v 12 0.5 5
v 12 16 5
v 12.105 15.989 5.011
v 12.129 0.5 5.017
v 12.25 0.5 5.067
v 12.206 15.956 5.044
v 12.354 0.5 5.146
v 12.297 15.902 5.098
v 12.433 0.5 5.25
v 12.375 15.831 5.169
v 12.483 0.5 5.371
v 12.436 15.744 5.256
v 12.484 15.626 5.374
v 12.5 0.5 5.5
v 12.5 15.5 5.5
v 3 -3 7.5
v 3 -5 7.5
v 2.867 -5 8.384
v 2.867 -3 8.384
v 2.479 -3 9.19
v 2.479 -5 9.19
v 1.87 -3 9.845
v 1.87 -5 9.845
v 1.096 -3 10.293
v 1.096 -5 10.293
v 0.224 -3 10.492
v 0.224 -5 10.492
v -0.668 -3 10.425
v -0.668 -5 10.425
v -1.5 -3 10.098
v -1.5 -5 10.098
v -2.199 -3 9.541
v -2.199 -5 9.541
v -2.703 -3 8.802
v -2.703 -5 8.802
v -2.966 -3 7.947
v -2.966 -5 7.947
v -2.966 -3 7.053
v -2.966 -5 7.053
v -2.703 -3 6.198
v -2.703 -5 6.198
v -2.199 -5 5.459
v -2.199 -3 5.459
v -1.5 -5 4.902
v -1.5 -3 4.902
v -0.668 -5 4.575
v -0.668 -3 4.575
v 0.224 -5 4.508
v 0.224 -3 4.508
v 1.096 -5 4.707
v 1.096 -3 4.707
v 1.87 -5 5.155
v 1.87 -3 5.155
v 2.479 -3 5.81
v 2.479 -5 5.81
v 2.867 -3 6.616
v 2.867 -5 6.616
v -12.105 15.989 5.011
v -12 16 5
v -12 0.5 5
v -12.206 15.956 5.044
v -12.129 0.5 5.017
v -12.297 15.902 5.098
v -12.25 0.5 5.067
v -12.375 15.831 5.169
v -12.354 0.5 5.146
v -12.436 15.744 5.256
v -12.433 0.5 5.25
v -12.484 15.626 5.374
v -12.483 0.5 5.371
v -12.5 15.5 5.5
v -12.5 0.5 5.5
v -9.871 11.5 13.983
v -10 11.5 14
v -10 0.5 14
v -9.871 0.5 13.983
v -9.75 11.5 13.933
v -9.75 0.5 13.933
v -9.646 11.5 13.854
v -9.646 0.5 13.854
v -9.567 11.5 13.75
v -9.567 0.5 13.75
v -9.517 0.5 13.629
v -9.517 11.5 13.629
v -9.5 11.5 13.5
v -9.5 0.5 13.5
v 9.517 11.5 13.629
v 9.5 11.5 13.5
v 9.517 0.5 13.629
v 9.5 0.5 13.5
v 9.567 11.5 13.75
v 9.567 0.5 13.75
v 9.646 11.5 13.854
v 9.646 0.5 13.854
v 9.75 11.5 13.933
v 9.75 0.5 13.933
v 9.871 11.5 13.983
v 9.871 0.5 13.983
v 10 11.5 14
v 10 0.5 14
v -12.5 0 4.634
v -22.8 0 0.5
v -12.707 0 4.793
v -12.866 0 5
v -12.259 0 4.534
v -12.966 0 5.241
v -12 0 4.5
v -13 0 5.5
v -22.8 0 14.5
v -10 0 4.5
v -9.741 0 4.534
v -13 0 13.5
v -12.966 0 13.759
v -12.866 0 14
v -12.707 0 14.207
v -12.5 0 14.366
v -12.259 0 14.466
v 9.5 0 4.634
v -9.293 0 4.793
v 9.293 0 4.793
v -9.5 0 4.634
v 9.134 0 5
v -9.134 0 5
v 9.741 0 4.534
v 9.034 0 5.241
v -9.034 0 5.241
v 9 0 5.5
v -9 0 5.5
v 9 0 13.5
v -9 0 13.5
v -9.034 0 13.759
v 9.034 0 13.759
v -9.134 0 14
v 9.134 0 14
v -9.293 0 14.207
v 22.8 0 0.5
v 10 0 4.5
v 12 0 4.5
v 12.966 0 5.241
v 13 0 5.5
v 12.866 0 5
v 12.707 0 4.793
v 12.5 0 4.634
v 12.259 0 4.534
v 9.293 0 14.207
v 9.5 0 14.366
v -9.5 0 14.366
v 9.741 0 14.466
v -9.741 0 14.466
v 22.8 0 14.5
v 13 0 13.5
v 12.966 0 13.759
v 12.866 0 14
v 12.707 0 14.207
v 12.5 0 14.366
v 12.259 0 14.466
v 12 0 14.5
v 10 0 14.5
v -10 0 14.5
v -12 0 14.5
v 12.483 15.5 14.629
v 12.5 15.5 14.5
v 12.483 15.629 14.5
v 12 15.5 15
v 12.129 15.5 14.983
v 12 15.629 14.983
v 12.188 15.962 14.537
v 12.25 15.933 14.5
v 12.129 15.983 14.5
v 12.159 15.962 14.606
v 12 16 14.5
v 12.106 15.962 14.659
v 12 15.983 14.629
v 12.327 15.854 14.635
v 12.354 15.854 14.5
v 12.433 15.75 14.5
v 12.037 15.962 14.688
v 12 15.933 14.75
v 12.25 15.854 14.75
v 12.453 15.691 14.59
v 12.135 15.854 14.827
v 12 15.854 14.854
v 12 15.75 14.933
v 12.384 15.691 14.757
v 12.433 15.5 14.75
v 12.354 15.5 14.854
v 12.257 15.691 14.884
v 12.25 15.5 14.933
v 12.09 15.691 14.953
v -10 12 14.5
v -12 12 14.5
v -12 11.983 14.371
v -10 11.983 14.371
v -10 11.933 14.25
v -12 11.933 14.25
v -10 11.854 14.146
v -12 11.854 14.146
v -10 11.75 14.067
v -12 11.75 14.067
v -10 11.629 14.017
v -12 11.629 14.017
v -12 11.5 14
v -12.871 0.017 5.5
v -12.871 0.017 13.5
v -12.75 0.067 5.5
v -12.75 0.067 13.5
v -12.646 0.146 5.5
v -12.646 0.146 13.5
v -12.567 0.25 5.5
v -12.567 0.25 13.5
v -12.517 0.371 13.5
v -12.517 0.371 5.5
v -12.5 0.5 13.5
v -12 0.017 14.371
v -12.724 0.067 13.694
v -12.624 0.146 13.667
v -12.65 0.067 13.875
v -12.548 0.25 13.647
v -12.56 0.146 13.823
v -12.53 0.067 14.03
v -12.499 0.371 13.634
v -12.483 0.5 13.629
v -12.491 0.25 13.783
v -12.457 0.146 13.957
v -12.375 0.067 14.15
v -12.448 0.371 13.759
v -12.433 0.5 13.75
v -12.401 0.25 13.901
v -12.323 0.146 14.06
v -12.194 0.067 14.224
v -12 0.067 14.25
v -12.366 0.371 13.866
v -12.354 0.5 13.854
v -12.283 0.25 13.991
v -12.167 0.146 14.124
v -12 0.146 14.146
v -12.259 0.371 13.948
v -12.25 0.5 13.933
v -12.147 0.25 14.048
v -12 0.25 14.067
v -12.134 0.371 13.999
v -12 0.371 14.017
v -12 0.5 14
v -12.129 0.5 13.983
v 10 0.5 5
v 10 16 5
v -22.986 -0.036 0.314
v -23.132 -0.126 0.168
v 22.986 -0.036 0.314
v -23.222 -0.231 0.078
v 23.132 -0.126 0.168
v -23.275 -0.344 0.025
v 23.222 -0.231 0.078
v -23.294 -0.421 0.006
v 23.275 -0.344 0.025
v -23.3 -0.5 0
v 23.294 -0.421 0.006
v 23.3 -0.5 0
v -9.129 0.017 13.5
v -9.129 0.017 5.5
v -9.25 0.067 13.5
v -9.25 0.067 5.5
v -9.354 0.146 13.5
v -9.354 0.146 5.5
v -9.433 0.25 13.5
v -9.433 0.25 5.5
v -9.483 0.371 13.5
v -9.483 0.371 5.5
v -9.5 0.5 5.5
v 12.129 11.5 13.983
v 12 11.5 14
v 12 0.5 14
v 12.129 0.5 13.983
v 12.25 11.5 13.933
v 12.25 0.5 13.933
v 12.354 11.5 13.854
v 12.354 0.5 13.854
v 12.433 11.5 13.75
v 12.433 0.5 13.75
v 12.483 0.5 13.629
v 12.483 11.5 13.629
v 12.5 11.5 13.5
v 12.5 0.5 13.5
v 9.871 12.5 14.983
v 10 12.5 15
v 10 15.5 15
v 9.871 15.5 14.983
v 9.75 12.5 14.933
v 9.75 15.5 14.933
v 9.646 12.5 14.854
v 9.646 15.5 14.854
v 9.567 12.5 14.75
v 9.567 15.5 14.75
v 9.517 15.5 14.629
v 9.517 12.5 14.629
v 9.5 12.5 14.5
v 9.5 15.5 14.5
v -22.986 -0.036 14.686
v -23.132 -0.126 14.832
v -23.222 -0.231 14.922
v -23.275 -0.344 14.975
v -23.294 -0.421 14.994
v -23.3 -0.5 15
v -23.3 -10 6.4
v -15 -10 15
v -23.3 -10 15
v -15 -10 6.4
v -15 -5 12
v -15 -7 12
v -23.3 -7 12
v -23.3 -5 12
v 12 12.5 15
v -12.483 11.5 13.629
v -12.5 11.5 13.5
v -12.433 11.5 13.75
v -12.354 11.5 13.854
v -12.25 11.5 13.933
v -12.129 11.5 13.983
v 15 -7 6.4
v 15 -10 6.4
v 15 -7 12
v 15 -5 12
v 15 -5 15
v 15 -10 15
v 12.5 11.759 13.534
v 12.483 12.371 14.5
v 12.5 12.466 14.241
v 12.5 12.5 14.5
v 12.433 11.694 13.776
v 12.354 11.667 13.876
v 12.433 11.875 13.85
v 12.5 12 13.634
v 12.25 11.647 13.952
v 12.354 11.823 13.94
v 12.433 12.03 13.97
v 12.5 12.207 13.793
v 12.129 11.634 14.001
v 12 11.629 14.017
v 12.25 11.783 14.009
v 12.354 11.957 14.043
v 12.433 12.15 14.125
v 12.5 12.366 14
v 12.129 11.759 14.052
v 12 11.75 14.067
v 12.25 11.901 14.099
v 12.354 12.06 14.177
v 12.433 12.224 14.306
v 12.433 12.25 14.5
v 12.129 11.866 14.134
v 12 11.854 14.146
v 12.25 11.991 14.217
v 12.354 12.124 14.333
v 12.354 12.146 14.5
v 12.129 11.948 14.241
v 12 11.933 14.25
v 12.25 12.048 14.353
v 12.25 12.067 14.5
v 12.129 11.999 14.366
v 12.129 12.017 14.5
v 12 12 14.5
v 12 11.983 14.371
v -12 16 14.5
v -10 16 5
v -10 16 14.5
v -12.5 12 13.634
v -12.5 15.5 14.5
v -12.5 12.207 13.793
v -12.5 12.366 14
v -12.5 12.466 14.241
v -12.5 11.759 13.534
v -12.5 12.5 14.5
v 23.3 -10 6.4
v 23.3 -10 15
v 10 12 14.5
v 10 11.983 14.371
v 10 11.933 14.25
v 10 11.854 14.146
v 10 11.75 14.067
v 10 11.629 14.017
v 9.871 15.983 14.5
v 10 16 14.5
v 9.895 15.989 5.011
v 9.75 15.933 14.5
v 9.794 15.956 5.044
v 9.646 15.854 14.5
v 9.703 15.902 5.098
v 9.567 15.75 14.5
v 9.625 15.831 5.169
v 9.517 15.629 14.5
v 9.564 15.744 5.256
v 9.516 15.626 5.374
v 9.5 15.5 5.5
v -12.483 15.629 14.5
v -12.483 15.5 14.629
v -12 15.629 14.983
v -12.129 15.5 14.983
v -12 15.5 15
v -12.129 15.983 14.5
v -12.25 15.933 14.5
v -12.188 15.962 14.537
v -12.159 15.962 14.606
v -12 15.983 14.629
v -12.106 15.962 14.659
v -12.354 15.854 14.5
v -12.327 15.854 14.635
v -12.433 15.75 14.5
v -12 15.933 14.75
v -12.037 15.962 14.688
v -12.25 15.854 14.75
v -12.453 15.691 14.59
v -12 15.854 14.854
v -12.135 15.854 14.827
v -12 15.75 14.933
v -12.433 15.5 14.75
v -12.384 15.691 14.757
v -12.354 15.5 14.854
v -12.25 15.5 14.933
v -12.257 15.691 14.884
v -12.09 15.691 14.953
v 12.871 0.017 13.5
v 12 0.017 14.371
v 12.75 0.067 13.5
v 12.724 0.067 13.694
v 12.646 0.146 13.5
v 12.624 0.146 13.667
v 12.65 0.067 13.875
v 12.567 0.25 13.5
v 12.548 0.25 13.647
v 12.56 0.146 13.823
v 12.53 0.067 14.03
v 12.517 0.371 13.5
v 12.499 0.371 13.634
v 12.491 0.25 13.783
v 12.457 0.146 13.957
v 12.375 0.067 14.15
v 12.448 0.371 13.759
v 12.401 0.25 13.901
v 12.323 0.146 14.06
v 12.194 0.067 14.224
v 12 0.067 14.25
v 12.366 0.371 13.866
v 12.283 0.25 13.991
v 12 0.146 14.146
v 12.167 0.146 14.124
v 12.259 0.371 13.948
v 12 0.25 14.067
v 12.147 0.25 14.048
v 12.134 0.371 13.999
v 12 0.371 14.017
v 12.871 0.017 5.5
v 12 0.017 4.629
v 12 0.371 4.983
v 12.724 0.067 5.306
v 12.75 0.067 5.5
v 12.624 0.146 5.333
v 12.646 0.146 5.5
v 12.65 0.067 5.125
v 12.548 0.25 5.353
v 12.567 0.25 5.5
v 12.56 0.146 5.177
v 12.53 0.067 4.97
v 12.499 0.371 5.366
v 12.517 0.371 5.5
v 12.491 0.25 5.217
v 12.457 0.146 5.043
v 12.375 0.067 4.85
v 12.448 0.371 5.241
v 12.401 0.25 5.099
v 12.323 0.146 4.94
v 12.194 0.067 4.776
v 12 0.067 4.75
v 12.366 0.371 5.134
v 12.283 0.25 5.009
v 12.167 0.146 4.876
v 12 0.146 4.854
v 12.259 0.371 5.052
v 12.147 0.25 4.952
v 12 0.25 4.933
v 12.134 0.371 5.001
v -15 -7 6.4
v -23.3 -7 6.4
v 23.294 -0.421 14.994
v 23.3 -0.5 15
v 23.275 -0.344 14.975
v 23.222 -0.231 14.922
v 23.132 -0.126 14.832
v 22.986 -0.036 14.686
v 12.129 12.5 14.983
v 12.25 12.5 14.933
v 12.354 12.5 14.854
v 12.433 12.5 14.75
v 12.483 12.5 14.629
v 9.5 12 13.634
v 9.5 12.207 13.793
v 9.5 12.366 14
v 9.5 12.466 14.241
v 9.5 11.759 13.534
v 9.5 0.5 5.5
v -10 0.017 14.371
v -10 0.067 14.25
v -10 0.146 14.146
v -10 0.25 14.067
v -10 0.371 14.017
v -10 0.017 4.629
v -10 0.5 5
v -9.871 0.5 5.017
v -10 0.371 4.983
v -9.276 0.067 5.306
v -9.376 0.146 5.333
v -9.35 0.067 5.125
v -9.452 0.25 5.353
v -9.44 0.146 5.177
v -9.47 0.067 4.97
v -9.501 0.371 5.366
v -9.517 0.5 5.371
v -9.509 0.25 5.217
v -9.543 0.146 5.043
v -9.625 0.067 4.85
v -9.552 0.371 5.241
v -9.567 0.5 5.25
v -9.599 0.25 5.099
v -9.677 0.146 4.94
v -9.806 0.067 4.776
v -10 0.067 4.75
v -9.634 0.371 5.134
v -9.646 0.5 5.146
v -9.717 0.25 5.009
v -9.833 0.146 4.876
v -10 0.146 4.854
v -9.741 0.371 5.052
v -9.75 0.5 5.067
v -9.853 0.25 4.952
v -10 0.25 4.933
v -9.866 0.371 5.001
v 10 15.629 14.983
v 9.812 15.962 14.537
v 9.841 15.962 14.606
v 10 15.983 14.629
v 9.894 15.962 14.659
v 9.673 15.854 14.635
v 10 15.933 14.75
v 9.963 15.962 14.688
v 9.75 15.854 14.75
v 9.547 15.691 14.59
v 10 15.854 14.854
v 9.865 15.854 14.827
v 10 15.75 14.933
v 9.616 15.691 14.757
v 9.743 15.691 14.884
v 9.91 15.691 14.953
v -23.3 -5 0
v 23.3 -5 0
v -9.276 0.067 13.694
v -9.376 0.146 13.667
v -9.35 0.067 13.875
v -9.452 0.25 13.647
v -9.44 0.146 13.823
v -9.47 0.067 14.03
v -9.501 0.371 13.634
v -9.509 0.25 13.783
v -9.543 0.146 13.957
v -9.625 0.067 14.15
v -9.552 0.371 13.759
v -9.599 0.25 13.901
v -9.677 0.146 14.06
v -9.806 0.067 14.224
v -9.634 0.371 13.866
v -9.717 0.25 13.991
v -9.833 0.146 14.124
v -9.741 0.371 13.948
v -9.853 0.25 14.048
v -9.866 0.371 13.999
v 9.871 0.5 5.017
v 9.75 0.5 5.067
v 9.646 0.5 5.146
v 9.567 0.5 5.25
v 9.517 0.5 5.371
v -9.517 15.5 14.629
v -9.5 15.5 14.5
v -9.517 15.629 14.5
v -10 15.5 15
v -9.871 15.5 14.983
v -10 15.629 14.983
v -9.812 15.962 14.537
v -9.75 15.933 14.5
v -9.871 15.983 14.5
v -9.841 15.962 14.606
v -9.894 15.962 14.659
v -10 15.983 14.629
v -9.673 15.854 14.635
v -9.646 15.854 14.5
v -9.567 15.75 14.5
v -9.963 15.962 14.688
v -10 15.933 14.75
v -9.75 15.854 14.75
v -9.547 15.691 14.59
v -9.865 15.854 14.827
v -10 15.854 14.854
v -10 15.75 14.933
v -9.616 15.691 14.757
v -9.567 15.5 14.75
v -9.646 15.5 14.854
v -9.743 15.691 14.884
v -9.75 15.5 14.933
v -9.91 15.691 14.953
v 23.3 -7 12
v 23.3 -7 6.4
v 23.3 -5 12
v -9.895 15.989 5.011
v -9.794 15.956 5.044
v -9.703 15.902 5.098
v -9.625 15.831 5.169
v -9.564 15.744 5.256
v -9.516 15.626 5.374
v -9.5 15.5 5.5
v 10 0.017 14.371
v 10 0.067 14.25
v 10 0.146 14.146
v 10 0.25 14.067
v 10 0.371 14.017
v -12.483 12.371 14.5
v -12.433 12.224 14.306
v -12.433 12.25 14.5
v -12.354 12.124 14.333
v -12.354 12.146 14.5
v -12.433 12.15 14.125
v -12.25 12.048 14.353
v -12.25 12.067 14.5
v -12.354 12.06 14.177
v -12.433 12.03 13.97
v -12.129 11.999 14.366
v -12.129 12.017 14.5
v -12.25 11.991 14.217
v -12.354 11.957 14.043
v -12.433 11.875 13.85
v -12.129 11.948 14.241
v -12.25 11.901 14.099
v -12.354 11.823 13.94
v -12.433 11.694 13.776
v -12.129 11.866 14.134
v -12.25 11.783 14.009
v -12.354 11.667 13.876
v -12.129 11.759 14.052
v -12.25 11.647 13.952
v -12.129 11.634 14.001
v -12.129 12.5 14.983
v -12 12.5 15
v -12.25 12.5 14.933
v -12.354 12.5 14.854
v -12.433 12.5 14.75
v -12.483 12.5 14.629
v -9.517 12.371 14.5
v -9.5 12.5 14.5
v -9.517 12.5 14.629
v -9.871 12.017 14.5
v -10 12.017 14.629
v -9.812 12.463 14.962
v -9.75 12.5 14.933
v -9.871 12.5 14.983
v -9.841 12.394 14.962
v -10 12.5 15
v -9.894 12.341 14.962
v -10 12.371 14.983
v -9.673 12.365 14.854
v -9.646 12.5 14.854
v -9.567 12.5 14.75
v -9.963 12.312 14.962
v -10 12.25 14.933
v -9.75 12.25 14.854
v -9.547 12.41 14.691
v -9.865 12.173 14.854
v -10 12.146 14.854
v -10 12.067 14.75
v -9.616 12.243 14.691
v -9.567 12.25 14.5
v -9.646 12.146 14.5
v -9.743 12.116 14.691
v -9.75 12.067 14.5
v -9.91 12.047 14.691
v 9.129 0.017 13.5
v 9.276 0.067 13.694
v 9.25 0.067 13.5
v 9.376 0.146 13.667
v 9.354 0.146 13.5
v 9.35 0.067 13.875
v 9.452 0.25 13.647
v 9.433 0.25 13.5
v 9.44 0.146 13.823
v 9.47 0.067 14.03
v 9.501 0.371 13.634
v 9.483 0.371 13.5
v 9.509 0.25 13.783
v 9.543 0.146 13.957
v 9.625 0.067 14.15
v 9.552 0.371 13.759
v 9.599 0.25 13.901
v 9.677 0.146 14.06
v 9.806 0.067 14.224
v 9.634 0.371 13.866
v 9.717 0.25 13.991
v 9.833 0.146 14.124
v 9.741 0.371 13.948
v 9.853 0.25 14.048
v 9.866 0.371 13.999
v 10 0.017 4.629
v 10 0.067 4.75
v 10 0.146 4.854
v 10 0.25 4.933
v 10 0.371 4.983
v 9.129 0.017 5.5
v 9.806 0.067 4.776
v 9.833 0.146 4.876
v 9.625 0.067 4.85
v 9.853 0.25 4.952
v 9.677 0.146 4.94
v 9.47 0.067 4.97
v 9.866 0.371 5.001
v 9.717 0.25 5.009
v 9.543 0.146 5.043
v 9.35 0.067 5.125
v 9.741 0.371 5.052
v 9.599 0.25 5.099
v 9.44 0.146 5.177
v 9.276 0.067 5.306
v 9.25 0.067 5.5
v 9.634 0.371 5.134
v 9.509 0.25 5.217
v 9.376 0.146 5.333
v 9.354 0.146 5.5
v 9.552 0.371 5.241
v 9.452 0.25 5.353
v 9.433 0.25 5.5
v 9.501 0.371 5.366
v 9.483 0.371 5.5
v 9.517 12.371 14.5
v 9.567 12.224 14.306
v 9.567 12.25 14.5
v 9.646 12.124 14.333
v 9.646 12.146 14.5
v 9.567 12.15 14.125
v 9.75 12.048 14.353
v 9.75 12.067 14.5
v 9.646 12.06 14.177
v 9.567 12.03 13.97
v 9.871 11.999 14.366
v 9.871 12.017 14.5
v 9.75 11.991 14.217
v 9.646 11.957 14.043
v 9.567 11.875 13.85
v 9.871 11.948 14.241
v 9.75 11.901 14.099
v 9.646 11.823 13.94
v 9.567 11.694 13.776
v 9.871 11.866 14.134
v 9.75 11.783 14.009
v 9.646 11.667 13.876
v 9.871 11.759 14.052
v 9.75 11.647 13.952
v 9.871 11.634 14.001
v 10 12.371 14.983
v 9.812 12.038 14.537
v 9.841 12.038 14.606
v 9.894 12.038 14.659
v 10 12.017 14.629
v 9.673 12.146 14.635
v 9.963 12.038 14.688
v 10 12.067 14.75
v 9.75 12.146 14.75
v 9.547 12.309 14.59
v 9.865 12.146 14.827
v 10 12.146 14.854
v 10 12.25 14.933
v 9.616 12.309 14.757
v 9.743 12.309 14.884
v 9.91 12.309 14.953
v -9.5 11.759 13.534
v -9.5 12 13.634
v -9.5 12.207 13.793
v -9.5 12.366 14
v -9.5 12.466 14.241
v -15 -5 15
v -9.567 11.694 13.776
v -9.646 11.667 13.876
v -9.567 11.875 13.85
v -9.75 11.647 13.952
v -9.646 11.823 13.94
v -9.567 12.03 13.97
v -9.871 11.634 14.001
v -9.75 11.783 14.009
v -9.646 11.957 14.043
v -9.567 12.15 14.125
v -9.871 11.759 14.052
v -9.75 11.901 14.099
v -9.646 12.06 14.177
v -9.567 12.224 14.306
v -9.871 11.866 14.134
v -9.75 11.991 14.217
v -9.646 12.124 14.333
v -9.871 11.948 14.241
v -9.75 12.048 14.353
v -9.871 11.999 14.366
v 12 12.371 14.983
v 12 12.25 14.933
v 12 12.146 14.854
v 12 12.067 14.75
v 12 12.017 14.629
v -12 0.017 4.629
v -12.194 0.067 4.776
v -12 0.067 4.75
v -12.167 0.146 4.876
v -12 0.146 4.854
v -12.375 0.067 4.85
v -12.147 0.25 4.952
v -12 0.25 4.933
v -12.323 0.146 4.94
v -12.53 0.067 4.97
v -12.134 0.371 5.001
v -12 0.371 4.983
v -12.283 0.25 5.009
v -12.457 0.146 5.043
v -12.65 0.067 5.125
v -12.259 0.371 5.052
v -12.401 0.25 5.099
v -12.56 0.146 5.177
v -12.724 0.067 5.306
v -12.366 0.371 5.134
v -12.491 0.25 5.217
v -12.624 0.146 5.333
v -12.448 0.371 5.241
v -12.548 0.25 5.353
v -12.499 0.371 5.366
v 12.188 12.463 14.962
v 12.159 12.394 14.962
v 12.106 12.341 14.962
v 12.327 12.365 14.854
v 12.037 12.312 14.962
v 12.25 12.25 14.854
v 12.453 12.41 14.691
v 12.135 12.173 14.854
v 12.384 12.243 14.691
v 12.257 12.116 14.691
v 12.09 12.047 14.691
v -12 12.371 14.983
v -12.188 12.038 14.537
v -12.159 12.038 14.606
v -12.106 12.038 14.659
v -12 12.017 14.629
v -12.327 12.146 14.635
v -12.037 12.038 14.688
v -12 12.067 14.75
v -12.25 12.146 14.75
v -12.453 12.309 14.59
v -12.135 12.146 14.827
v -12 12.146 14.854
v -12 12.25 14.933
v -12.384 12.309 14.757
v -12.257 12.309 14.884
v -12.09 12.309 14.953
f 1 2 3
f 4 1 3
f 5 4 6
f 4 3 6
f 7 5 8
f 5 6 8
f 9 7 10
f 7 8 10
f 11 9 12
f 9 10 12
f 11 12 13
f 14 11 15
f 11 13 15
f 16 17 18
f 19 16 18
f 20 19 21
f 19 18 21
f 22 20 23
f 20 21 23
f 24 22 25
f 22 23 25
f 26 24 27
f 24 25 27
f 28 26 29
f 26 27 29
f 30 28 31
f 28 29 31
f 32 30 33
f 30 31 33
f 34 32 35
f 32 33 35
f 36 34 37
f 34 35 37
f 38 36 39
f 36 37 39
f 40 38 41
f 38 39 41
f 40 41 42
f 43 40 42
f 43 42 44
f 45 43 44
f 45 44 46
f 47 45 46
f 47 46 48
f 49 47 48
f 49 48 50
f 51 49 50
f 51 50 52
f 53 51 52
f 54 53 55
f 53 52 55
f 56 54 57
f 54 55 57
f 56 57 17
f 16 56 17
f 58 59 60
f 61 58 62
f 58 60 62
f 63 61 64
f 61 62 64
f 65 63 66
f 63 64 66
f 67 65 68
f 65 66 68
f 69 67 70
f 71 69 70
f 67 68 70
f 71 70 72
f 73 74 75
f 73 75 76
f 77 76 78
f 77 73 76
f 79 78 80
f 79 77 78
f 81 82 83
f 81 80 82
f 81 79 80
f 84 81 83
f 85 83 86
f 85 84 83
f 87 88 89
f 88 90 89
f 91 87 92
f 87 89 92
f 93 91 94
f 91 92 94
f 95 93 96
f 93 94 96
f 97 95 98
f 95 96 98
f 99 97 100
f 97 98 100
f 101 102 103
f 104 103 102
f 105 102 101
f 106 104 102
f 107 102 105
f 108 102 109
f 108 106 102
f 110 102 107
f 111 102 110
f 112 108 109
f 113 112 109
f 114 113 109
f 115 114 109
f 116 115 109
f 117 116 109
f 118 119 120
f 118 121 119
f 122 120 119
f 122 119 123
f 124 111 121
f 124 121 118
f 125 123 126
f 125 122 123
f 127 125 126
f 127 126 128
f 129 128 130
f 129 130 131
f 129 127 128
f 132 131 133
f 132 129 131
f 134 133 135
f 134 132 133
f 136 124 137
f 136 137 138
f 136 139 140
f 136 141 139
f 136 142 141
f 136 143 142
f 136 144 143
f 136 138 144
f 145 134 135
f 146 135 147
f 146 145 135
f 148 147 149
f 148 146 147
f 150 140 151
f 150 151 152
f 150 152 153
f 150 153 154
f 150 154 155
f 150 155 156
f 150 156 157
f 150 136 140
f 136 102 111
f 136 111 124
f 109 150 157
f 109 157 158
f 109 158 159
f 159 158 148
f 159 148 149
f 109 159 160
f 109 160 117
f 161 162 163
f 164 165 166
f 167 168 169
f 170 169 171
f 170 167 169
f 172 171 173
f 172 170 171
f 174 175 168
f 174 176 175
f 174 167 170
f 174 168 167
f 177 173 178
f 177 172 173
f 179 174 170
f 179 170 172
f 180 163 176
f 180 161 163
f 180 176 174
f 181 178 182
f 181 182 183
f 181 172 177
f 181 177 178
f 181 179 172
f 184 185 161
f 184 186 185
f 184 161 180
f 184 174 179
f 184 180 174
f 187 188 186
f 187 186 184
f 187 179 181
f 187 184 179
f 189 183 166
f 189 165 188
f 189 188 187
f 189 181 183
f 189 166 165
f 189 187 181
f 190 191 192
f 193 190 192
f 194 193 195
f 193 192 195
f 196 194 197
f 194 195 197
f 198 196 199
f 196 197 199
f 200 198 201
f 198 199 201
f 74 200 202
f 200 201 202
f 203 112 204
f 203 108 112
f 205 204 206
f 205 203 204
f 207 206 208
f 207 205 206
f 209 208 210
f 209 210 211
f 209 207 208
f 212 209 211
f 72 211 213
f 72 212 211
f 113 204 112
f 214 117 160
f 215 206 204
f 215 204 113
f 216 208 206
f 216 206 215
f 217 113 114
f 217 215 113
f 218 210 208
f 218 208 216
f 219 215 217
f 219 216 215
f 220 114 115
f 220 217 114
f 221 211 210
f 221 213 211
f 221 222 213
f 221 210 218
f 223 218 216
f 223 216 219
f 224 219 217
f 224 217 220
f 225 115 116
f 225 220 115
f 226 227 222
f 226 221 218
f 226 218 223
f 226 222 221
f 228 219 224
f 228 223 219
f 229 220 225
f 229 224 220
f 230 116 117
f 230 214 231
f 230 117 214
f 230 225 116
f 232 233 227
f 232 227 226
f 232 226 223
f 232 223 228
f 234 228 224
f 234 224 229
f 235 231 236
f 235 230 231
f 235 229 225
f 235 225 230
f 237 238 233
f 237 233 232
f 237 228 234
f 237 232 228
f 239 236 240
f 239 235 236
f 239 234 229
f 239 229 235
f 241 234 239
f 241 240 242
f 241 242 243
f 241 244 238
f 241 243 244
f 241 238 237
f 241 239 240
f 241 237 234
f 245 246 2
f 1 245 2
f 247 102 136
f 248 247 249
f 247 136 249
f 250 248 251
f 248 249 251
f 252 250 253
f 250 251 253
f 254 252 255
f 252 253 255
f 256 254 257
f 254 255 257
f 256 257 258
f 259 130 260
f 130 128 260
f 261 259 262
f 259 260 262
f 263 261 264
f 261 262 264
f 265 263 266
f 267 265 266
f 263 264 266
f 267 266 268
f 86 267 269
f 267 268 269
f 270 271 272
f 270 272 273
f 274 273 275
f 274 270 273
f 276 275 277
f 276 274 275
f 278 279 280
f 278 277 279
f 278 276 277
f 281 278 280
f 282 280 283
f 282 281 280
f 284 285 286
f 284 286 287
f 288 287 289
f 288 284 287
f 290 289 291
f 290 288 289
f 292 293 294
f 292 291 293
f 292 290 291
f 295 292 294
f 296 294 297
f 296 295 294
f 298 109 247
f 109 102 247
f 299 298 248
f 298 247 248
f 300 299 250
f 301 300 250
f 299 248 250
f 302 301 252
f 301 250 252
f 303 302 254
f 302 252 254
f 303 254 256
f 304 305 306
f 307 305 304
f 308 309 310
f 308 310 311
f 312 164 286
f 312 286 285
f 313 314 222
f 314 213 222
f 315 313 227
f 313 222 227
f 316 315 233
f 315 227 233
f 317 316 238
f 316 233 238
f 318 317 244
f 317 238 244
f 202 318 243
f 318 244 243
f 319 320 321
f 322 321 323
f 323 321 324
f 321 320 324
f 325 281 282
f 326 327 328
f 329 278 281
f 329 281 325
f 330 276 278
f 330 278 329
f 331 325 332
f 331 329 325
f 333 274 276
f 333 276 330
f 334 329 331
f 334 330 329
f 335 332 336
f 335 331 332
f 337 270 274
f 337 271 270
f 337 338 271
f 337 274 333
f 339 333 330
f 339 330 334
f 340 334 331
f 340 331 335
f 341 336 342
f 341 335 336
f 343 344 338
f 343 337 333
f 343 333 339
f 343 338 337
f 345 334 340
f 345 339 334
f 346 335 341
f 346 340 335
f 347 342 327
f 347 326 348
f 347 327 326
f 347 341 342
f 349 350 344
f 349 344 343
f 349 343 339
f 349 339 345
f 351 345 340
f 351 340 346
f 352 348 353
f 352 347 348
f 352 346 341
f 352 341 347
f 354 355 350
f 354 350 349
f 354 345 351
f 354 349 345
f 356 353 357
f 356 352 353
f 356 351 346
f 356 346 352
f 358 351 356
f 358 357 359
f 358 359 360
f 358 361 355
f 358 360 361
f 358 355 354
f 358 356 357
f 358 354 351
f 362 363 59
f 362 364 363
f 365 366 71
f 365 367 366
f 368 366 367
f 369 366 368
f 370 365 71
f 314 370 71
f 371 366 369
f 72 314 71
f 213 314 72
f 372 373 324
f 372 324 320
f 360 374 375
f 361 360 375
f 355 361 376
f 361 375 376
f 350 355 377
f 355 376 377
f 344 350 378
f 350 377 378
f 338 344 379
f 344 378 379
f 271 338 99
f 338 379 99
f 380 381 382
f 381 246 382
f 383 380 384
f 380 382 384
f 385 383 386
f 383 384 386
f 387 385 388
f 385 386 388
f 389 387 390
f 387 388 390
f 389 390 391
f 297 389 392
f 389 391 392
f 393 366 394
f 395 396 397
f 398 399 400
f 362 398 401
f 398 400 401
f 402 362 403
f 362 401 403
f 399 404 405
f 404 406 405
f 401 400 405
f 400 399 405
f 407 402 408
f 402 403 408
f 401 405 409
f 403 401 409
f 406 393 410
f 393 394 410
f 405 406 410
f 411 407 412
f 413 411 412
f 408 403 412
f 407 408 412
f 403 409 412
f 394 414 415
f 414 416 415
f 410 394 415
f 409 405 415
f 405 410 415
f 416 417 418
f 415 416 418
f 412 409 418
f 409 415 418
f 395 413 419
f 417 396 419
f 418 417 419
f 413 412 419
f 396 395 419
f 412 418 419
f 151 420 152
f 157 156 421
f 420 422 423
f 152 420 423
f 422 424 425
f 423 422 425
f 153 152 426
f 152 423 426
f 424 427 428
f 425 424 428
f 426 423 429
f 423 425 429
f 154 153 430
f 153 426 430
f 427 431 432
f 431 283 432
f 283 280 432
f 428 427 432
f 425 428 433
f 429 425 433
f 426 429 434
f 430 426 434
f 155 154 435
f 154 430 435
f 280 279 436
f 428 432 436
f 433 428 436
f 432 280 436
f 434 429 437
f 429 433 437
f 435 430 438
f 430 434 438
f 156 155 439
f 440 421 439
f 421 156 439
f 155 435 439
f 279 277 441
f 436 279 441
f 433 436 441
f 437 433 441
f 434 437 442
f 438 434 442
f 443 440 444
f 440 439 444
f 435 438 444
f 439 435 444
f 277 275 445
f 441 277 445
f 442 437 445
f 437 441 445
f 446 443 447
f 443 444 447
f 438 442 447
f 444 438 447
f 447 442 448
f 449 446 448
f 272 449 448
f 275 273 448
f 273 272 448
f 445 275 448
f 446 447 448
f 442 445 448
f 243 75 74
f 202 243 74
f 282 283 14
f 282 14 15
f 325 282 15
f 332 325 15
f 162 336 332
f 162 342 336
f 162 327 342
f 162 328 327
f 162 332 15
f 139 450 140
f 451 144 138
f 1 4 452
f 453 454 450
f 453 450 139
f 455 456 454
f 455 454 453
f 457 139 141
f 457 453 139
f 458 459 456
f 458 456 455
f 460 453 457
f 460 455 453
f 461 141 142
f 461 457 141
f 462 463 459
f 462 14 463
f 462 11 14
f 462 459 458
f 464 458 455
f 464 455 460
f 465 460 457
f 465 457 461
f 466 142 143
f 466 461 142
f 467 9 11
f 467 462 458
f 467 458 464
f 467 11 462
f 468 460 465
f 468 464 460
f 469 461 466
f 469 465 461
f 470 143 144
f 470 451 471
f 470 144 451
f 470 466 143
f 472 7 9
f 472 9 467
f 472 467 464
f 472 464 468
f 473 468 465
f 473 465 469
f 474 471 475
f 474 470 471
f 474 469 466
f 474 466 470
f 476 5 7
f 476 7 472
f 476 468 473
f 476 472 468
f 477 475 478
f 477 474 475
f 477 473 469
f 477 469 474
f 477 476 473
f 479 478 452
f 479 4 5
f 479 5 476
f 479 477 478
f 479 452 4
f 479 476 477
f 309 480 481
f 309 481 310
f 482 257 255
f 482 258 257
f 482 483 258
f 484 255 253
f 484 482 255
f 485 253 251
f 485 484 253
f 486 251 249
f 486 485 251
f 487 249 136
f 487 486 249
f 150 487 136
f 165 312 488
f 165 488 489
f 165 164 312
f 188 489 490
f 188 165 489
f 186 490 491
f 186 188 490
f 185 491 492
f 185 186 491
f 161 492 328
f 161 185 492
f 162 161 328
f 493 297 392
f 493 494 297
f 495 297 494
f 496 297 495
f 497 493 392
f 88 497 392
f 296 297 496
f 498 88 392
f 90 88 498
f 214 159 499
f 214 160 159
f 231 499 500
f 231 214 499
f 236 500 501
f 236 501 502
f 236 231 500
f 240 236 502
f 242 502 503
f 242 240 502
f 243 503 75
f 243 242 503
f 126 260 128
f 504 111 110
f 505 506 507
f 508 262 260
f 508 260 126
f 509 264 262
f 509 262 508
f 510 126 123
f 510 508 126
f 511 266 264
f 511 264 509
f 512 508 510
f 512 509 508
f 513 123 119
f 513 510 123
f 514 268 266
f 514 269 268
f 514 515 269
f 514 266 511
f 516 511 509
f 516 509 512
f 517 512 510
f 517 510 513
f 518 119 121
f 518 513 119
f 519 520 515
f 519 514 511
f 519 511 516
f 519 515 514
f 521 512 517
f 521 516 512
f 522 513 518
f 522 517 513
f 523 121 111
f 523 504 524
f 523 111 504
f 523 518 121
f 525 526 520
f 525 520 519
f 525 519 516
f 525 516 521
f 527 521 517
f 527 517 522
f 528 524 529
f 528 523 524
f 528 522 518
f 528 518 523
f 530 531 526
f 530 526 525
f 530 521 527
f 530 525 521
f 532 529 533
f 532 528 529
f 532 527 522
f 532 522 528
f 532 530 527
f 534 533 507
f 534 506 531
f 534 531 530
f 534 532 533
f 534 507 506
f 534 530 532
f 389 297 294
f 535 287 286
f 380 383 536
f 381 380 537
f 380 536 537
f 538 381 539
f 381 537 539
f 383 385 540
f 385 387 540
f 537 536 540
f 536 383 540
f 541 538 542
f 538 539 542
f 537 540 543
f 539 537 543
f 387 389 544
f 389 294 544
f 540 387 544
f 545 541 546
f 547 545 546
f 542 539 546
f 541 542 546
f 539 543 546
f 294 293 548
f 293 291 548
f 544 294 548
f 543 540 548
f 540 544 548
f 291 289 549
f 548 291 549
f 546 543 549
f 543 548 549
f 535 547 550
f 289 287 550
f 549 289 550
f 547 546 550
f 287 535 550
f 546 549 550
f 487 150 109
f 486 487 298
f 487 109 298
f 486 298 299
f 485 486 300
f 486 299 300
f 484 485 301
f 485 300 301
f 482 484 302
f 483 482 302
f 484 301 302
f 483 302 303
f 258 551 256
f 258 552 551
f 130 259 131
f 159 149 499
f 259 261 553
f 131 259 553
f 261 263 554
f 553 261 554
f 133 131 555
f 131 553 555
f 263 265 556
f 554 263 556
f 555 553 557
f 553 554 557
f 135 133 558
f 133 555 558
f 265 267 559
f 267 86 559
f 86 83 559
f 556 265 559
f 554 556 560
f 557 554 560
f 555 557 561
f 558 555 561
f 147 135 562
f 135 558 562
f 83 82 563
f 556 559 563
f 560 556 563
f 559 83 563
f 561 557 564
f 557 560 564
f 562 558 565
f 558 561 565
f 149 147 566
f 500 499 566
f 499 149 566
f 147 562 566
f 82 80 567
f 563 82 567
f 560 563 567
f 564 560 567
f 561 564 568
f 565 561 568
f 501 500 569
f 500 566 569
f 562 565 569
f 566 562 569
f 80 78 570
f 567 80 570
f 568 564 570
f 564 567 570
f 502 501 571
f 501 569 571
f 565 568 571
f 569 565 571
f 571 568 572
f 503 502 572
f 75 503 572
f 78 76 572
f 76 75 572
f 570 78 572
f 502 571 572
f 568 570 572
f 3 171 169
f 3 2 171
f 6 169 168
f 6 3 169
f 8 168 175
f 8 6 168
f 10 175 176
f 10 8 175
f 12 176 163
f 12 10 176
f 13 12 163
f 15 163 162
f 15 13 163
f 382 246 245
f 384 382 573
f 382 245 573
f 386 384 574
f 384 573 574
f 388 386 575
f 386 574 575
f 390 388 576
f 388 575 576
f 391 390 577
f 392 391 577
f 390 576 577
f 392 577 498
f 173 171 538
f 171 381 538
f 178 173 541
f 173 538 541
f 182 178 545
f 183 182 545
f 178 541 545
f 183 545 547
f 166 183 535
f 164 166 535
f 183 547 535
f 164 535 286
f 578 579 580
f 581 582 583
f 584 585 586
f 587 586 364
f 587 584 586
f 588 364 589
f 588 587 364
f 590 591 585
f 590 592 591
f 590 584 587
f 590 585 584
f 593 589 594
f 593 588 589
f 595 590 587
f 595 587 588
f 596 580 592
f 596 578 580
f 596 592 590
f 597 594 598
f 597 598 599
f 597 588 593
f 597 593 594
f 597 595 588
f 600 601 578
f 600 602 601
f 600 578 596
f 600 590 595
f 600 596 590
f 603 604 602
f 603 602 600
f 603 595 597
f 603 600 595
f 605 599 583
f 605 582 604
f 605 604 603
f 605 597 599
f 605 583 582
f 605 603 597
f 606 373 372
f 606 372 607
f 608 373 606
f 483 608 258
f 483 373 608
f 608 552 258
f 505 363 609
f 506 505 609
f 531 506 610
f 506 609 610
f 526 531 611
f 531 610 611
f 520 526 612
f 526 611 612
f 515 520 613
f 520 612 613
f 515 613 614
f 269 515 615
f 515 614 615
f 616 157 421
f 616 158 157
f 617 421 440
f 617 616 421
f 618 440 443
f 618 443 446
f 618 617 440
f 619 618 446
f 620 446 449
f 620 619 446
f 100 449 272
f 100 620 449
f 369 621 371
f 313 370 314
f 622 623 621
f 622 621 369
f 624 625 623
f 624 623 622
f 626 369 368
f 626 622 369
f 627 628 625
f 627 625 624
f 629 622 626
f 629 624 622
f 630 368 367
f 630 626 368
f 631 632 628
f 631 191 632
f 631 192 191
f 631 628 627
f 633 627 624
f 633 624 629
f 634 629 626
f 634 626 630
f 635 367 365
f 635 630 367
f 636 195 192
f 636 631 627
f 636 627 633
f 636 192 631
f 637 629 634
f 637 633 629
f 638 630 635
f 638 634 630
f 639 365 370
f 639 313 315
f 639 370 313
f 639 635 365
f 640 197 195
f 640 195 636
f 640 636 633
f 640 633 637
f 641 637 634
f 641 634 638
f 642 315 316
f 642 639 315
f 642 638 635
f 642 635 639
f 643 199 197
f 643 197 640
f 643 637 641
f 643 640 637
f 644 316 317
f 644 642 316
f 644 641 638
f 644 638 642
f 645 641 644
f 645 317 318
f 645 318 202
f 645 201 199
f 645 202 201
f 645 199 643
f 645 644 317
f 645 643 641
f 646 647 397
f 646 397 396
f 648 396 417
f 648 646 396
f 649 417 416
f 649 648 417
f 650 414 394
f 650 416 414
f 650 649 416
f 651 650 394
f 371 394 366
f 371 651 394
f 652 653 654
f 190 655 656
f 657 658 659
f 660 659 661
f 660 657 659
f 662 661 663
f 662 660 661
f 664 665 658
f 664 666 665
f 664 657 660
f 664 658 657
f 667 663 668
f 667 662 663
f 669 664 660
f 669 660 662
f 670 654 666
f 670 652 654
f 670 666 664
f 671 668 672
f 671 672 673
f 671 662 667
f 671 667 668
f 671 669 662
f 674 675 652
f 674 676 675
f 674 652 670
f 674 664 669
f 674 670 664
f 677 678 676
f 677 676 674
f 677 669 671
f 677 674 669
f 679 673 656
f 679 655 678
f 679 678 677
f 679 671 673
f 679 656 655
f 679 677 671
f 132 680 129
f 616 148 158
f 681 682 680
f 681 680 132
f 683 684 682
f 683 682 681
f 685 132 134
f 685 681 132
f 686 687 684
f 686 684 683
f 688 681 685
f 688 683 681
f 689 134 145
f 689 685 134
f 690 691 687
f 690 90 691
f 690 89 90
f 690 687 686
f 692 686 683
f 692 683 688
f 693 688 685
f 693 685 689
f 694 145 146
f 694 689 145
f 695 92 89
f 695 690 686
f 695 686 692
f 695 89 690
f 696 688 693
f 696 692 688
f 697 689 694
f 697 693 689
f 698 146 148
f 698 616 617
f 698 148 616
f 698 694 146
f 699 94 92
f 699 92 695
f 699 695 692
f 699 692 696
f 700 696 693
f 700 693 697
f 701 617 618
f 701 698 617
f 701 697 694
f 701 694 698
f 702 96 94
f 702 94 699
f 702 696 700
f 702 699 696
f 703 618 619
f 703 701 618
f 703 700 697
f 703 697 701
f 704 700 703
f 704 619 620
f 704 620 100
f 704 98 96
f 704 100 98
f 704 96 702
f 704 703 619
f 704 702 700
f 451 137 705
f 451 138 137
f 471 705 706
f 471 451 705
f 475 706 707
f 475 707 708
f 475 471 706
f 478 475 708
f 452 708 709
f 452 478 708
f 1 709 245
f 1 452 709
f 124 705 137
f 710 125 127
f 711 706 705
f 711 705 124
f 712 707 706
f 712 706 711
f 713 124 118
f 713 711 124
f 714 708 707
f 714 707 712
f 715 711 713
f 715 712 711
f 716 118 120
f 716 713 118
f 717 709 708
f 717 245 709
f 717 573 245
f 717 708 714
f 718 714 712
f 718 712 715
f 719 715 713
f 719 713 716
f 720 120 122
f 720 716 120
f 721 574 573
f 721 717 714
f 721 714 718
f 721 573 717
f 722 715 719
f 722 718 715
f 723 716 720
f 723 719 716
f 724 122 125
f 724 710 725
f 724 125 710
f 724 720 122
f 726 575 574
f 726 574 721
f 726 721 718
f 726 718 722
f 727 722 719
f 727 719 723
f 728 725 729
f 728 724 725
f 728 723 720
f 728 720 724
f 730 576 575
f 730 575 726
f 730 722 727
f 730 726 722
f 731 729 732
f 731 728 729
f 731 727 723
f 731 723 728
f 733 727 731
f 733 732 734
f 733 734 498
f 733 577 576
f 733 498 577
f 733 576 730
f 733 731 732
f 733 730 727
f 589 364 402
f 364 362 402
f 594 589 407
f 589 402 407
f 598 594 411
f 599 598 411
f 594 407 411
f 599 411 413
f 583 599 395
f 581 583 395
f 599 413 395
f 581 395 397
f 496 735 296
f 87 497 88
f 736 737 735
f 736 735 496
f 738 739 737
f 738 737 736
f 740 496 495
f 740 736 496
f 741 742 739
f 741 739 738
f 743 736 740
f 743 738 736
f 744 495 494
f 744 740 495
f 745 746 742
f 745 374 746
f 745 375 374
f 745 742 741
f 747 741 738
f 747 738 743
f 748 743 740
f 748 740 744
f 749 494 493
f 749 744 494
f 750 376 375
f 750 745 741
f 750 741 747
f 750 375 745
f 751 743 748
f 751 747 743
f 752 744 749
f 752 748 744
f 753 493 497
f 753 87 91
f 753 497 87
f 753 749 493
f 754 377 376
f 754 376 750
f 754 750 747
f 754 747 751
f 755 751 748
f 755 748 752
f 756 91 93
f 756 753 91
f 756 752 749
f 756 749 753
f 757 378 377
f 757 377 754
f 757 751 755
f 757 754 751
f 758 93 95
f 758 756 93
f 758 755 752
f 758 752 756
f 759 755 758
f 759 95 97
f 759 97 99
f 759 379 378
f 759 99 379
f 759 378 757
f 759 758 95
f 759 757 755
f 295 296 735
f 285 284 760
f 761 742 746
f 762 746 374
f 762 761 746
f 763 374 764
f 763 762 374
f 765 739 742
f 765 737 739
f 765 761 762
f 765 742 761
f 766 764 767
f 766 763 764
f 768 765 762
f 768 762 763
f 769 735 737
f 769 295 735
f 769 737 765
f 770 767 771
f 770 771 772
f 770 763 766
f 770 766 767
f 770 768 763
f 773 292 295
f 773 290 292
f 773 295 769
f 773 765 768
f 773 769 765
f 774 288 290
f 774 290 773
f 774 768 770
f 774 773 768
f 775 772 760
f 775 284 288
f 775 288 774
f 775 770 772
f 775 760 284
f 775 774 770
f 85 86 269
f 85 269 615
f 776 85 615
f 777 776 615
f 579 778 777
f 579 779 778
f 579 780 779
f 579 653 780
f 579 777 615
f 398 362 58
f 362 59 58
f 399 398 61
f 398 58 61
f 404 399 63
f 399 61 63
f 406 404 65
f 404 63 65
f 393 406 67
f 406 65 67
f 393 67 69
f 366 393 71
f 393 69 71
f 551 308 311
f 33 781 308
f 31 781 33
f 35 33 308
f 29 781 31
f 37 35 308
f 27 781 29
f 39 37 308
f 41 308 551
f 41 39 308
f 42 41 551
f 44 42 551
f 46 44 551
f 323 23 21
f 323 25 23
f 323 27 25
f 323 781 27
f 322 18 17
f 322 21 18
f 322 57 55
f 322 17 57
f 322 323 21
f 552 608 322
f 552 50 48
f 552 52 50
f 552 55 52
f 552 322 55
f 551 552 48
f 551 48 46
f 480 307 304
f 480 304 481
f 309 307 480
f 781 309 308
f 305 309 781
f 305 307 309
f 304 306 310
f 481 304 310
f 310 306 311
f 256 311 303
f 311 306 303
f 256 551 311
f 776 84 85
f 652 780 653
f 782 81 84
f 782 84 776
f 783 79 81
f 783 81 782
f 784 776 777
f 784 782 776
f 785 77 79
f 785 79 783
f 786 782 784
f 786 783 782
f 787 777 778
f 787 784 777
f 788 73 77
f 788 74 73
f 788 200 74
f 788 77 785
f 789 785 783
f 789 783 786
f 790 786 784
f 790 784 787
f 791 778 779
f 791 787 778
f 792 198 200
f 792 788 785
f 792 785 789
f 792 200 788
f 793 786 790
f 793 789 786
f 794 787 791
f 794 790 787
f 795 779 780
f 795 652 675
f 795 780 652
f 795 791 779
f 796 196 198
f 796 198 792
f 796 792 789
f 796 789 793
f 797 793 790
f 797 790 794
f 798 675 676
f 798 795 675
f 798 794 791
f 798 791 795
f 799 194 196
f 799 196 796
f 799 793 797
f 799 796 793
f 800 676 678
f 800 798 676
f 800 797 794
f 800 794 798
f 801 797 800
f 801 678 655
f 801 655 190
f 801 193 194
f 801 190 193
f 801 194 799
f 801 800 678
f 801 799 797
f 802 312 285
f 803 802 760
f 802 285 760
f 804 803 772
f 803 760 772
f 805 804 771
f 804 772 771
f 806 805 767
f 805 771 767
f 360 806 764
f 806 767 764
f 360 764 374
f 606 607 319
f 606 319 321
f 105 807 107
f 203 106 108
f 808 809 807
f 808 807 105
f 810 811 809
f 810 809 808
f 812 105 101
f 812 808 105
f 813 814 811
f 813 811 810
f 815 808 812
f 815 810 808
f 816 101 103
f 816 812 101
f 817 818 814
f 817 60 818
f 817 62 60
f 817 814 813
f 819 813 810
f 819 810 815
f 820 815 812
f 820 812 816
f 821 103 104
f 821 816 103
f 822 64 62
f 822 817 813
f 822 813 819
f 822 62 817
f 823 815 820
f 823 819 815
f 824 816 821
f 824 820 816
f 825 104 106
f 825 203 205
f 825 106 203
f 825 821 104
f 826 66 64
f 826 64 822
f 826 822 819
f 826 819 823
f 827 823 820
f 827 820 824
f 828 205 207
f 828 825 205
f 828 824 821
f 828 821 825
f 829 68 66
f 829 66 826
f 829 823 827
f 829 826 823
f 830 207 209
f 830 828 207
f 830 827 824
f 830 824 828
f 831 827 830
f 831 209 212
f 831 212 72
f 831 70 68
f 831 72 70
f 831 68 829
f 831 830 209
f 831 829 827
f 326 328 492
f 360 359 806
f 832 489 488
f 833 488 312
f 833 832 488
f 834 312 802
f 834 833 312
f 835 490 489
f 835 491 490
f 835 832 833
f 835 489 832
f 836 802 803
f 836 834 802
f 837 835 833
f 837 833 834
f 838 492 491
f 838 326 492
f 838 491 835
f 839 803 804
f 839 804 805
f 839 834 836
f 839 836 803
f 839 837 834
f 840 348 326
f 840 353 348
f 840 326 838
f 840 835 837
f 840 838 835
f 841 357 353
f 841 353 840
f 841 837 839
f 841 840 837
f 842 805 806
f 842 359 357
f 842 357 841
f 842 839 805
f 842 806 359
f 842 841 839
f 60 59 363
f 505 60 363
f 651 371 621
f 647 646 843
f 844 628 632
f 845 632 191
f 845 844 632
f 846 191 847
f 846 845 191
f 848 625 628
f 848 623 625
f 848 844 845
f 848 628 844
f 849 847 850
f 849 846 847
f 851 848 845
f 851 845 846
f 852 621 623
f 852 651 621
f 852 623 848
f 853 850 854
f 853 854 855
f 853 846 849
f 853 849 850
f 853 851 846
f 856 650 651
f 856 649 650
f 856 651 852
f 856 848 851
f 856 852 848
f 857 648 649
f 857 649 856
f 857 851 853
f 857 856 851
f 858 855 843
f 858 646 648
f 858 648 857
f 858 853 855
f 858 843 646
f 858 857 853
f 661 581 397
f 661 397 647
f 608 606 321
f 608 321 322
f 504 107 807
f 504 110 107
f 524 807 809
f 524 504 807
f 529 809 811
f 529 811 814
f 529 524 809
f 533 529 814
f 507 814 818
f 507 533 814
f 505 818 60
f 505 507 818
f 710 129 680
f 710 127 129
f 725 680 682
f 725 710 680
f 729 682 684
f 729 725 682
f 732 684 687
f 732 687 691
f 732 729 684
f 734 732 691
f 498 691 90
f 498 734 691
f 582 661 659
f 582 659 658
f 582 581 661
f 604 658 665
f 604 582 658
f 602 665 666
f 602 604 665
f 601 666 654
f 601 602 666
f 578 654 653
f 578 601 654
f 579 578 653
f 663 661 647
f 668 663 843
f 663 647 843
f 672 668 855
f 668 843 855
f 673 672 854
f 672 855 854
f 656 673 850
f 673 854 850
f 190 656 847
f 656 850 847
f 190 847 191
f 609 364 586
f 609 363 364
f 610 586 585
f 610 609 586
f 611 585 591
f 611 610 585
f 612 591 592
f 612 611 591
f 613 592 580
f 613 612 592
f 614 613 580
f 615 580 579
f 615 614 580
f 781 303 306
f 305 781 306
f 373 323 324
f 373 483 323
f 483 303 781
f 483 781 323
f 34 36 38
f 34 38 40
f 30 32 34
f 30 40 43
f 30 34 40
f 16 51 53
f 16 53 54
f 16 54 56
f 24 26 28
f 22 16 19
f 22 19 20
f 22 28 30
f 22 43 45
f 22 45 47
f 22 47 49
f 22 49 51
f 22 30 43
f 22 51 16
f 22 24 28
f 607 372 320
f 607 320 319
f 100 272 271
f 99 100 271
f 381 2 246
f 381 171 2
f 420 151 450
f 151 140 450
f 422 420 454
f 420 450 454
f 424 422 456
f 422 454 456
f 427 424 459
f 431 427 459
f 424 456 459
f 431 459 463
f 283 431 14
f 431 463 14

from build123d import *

# Parameters (mm, degrees)
F1_DEPTH = 23.3
F2_W     = 30
F2_H     = 8.6
F3_DEPTH = 5
F4_R     = 3
F5_DEPTH = 2
F7_DEPTH = 10
F8_W     = 12
F8_H     = 1
F9_DEPTH = 35.801
F10_R    = 0.49999


# Not quite as in the source:
# - a fillet or chamfer is up to 0.001 mm smaller than in the source, because OpenCascade refuses the exact size


with BuildPart() as f1:
    # F0 (on Right) → F1 (new body, symmetric)
    with BuildSketch(Plane.YZ):
        Polygon((-5, 12), (-5, 0), (0, 0), (0, 15), (-10, 15), (-10, 6.4), (-7, 6.4), (-7, 12), align=None)
    extrude(amount=F1_DEPTH, both=True)

    # F2 (on face) → F3 (cut, through all)
    with BuildSketch(Plane.XZ.offset(10)):
        with Locations((0, 10.7)):
            Rectangle(F2_W, F2_H)
    extrude(amount=-F3_DEPTH, mode=Mode.SUBTRACT)

    # F4 (on face) → F5 (cut)
    with BuildSketch(Plane.XZ.offset(5)):
        with Locations((0, 7.5)):
            Circle(F4_R)
    extrude(amount=-F5_DEPTH, mode=Mode.SUBTRACT)

    # F6 (on face) → F7 (join)
    with BuildSketch(Plane.XY.offset(15)):
        Polygon((-12.5, 16), (-12.5, 0), (-9.5, 0), (-9.5, 13), (-9.5, 16), align=None)
        Polygon((9.5, 13), (9.5, 0), (12.5, 0), (12.5, 16), (9.5, 16), align=None)
    extrude(amount=-F7_DEPTH)

    # F8 (on face) → F9 (cut, through all)
    with BuildSketch(Plane.YZ.offset(12.5)):
        with Locations((6, 14.5)):
            Rectangle(F8_W, F8_H)
    extrude(amount=-F9_DEPTH, mode=Mode.SUBTRACT)

    # F10 (radius 0.5 in the source; OpenCascade refuses exactly that, so slightly less here)
    f10_edges = [f1.edges().sort_by_distance(p)[0] for p in [
        (-9.5, 6, 14),
        (-9.5, 12, 14.5),
        (-9.5, 14, 15),
        (-9.5, 16, 10),
        (-9.5, 8, 5),
        (-9.5, 0, 9.5),
        (12.5, 6, 14),
        (12.5, 12, 14.5),
        (12.5, 14, 15),
        (12.5, 16, 10),
        (12.5, 8, 5),
        (12.5, 0, 9.5),
        (9.5, 14, 15),
        (9.5, 12, 14.5),
        (9.5, 6, 14),
        (9.5, 0, 9.5),
        (9.5, 8, 5),
        (9.5, 16, 10),
        (-12.5, 14, 15),
        (-12.5, 12, 14.5),
        (-12.5, 6, 14),
        (-12.5, 0, 9.5),
        (-12.5, 8, 5),
        (-12.5, 16, 10),
        (11, 12, 14),
        (-11, 12, 14),
        (-11, 16, 15),
        (-11, 12, 15),
        (11, 16, 15),
        (11, 12, 15),
        (0, 0, 0),
        (-23.3, 0, 7.5),
        (0, 0, 15),
        (23.3, 0, 7.5),
        (11, 0, 14),
        (11, 0, 5),
        (-11, 0, 14),
        (-11, 0, 5),
    ]]
    fillet(f10_edges, radius=F10_R)


solid = f1.part
